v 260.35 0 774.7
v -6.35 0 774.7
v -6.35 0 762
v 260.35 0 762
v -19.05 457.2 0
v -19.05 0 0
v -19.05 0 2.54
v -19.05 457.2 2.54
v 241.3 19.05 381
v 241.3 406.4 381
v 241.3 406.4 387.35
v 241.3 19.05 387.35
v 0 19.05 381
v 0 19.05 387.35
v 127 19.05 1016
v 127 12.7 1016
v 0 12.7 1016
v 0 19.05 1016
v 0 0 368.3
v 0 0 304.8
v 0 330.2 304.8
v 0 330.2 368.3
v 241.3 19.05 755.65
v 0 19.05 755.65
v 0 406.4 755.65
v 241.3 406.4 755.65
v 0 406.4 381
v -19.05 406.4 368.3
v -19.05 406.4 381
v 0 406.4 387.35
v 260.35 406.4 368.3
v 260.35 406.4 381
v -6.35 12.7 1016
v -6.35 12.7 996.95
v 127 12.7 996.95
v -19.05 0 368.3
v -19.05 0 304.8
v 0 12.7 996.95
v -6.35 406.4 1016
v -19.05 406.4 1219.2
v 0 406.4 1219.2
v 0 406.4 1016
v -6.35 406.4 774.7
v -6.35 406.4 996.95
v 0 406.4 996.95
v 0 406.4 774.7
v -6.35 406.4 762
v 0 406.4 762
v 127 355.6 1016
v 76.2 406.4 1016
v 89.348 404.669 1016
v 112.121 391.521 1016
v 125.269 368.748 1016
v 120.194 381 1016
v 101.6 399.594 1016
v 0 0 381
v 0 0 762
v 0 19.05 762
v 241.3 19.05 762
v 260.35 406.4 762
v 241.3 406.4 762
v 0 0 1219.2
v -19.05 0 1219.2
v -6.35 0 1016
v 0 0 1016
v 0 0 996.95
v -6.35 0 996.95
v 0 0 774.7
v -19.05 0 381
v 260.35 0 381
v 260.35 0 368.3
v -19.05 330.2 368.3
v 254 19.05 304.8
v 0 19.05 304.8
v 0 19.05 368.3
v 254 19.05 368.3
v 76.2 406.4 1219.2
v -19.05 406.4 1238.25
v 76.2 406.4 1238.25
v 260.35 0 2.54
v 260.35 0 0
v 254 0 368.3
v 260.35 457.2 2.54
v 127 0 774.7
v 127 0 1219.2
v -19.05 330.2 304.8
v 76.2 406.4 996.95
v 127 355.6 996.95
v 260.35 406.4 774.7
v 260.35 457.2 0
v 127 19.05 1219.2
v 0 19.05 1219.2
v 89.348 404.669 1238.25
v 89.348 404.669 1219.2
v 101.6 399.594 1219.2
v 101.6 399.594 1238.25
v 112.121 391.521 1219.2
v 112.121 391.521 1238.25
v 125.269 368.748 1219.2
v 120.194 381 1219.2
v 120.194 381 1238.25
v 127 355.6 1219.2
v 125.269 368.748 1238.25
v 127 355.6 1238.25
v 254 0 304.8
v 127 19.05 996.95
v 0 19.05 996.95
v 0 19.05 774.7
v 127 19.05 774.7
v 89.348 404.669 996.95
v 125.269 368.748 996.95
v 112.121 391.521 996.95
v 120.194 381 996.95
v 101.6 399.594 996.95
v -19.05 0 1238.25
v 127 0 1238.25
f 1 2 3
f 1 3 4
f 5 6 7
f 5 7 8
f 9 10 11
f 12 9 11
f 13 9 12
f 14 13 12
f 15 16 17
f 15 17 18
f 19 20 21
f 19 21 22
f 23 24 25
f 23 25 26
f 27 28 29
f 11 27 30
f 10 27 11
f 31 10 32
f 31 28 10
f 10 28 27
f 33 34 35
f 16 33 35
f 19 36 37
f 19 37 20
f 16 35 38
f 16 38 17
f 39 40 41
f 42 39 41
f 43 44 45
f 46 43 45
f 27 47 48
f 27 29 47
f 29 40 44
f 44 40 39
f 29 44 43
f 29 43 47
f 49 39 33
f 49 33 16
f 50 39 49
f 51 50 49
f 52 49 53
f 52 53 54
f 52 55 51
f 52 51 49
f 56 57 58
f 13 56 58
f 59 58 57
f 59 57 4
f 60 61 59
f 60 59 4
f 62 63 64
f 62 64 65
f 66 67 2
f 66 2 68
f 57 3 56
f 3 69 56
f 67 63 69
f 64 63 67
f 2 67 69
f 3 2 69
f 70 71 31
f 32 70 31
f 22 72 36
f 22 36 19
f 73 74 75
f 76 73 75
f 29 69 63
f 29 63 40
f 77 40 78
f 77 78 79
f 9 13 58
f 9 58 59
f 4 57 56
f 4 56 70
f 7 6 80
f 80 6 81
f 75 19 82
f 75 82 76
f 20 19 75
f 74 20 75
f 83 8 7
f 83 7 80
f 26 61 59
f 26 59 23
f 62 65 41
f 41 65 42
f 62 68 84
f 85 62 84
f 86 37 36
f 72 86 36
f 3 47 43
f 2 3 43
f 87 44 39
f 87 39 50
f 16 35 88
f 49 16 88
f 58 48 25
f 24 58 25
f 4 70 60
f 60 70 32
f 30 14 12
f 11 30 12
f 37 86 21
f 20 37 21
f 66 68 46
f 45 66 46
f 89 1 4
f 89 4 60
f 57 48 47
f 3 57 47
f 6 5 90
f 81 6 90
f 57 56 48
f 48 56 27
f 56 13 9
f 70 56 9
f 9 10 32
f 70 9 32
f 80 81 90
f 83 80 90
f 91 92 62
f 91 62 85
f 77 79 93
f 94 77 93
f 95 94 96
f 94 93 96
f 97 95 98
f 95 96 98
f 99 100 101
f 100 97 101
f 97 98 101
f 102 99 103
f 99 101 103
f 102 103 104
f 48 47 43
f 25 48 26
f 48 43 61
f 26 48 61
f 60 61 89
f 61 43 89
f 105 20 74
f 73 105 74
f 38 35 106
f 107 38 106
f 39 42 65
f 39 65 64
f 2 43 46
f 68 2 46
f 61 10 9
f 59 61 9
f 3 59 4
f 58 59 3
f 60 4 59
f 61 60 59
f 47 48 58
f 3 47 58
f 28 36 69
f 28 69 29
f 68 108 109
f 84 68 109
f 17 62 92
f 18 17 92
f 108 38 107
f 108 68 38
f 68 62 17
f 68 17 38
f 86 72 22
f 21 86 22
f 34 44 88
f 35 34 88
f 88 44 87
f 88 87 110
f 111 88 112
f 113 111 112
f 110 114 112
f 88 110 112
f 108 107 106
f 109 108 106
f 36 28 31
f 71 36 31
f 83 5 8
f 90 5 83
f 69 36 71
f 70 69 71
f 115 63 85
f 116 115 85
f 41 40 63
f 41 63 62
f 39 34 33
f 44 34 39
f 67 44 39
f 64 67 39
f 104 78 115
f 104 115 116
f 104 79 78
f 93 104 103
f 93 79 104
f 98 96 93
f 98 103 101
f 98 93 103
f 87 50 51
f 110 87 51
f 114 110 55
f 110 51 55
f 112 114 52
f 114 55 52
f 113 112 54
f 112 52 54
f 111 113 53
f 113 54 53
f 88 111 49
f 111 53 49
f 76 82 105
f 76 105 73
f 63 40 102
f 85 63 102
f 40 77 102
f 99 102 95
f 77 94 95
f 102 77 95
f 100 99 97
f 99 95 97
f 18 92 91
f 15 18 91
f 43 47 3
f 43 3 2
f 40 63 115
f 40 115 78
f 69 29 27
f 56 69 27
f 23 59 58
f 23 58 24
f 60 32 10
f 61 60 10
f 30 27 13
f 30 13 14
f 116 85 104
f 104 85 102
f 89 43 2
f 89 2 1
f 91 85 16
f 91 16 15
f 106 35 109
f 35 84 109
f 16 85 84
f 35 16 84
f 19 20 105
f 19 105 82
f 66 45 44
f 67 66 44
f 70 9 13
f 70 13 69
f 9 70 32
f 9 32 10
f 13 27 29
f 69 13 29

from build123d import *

# Parameters (mm, degrees)
F0_W      = 19.05
F0_H      = 63.5
F1_DEPTH  = 330.2
F2_W      = 19.05
F2_H      = 63.5
F3_DEPTH  = 254
F4_W      = 279.4
F4_H      = 406.4
F5_DEPTH  = 19.05
F6_W      = 19.05
F6_H      = 6.35
F7_DEPTH  = 406.4
F8_W      = 19.05
F8_H      = 6.35
F9_DEPTH  = 241.3
F10_W     = 241.3
F10_H     = 19.05
F11_DEPTH = 381
F14_W     = 12.7
F14_H     = 12.7
F15_DEPTH = 406.4
F16_W     = 19.05
F16_H     = 406.4
F17_DEPTH = 838.2
F19_W     = 6.35
F19_H     = 19.05
F20_DEPTH = 406.4
F21_W     = 127
F21_H     = 19.05
F22_DEPTH = 444.5
F23_W     = 6.35
F23_H     = 19.05
F24_DEPTH = 127
F25_W     = 133.35
F25_H     = 393.7
F26_DEPTH = 19.05
F27_W     = 146.05
F27_H     = 406.4
F28_DEPTH = 19.05
F29_W     = 279.4
F29_H     = 457.2
F30_DEPTH = 2.54
F32_DEPTH = 254


with BuildPart() as f1:
    # F0 (on Front) → F1 (new body)
    with BuildSketch(Plane.XZ):
        with Locations((-9.525, 336.55)):
            Rectangle(F0_W, F0_H)
    extrude(amount=-F1_DEPTH)


with BuildPart() as f3:
    # F2 (on face) → F3 (new body)
    with BuildSketch(Plane.YZ):
        with Locations((9.525, 336.55)):
            Rectangle(F2_W, F2_H)
    extrude(amount=F3_DEPTH)


with BuildPart() as f5:
    # F4 (on face) → F5 (new body)
    with BuildSketch(Plane.XY.offset(368.3)):
        with Locations((120.65, 203.2)):
            Rectangle(F4_W, F4_H)
    extrude(amount=F5_DEPTH)

    # F6 (on face) → F7 (cut, through all)
    with BuildSketch(Plane(origin=(0, 406.4, 0), x_dir=(-1, 0, 0), z_dir=(0, 1, 0))):
        with Locations((9.525, 384.175)):
            Rectangle(F6_W, F6_H)
        with Locations((-250.825, 384.175)):
            Rectangle(F6_W, F6_H)
    extrude(amount=-F7_DEPTH, mode=Mode.SUBTRACT)

    # F8 (on face) → F9 (cut, through all)
    with BuildSketch(Plane.YZ.offset(241.3)):
        with Locations((9.525, 384.175)):
            Rectangle(F8_W, F8_H)
    extrude(amount=-F9_DEPTH, mode=Mode.SUBTRACT)


with BuildPart() as f11:
    # F10 (on face) → F11 (new body)
    with BuildSketch(Plane.XY.offset(381)):
        Polygon((241.3, 0), (260.35, 0), (260.35, 406.4), (241.3, 406.4), (241.3, 19.05), align=None)
        with Locations((120.65, 9.525)):
            Rectangle(F10_W, F10_H)
    extrude(amount=F11_DEPTH)


with BuildPart() as f13_1:
    # F13: instance of F5
    add(f5.part.mirror(Plane(origin=(202.3284313725, 131.0465686275, 571.5), x_dir=(1, 0, 0), z_dir=(0, 0, 1))))

    # F14 (on face) → F15 (cut, through all)
    with BuildSketch(Plane(origin=(0, 406.4, 0), x_dir=(-1, 0, 0), z_dir=(0, 1, 0))):
        with Locations((12.7, 768.35)):
            Rectangle(F14_W, F14_H)
    extrude(amount=-F15_DEPTH, mode=Mode.SUBTRACT)


with BuildPart() as f17:
    # F16 (on face) → F17 (new body)
    with BuildSketch(Plane.XY.offset(381)):
        with Locations((-9.525, 203.2)):
            Rectangle(F16_W, F16_H)
    extrude(amount=F17_DEPTH)

    # F18: cut F13_1
    add(f13_1.part, mode=Mode.SUBTRACT)

    # F19 (on face) → F20 (cut, through all)
    with BuildSketch(Plane(origin=(0, 406.4, 0), x_dir=(-1, 0, 0), z_dir=(0, 1, 0))):
        with Locations((3.175, 1006.475)):
            Rectangle(F19_W, F19_H)
    extrude(amount=-F20_DEPTH, mode=Mode.SUBTRACT)


with BuildPart() as f22:
    # F21 (on face) → F22 (new body, through all)
    with BuildSketch(Plane.XY.offset(774.7)):
        with Locations((63.5, 9.525)):
            Rectangle(F21_W, F21_H)
    extrude(amount=F22_DEPTH)

    # F23 (on face) → F24 (cut, through all)
    with BuildSketch(Plane.YZ.offset(127)):
        with Locations((15.875, 1006.475)):
            Rectangle(F23_W, F23_H)
    extrude(amount=-F24_DEPTH, mode=Mode.SUBTRACT)


with BuildPart() as f26:
    # F25 (on face) → F26 (new body)
    with BuildSketch(Plane.XY.offset(996.95)):
        with Locations((60.325, 209.55)):
            Rectangle(F25_W, F25_H)
    extrude(amount=F26_DEPTH)


with BuildPart() as f28:
    # F27 (on face) → F28 (new body)
    with BuildSketch(Plane.XY.offset(1219.2)):
        with Locations((53.975, 203.2)):
            Rectangle(F27_W, F27_H)
    extrude(amount=F28_DEPTH)


with BuildPart() as f30:
    # F29 (on Top) → F30 (new body)
    with BuildSketch(Plane.XY):
        with Locations((120.65, 228.6)):
            Rectangle(F29_W, F29_H)
    extrude(amount=F30_DEPTH)


with BuildPart() as f32_tool:
    # F31 (on face) → F32 (new body)
    with BuildSketch(Plane.XY.offset(1238.25)):
        with BuildLine():
            Line((127, 355.6), (127, 406.4))
            Line((127, 406.4), (76.2, 406.4))
            ThreePointArc((76.2, 406.4), (112.1210244843, 391.5210244843), (127, 355.6))
        make_face()
    extrude(amount=-F32_DEPTH)


with BuildPart() as f26_1:
    add(f26.part)

    # F32: cut by f32_tool
    add(f32_tool.part, mode=Mode.SUBTRACT)


with BuildPart() as f28_1:
    add(f28.part)

    # F32: cut by f32_tool
    add(f32_tool.part, mode=Mode.SUBTRACT)


with BuildPart() as f22_1:
    add(f22.part)

    # F33: cut F26
    add(f26_1.part, mode=Mode.SUBTRACT)


solid = Compound([f1.part, f3.part, f5.part, f11.part, f13_1.part, f17.part, f30.part, f26_1.part, f28_1.part, f22_1.part])
